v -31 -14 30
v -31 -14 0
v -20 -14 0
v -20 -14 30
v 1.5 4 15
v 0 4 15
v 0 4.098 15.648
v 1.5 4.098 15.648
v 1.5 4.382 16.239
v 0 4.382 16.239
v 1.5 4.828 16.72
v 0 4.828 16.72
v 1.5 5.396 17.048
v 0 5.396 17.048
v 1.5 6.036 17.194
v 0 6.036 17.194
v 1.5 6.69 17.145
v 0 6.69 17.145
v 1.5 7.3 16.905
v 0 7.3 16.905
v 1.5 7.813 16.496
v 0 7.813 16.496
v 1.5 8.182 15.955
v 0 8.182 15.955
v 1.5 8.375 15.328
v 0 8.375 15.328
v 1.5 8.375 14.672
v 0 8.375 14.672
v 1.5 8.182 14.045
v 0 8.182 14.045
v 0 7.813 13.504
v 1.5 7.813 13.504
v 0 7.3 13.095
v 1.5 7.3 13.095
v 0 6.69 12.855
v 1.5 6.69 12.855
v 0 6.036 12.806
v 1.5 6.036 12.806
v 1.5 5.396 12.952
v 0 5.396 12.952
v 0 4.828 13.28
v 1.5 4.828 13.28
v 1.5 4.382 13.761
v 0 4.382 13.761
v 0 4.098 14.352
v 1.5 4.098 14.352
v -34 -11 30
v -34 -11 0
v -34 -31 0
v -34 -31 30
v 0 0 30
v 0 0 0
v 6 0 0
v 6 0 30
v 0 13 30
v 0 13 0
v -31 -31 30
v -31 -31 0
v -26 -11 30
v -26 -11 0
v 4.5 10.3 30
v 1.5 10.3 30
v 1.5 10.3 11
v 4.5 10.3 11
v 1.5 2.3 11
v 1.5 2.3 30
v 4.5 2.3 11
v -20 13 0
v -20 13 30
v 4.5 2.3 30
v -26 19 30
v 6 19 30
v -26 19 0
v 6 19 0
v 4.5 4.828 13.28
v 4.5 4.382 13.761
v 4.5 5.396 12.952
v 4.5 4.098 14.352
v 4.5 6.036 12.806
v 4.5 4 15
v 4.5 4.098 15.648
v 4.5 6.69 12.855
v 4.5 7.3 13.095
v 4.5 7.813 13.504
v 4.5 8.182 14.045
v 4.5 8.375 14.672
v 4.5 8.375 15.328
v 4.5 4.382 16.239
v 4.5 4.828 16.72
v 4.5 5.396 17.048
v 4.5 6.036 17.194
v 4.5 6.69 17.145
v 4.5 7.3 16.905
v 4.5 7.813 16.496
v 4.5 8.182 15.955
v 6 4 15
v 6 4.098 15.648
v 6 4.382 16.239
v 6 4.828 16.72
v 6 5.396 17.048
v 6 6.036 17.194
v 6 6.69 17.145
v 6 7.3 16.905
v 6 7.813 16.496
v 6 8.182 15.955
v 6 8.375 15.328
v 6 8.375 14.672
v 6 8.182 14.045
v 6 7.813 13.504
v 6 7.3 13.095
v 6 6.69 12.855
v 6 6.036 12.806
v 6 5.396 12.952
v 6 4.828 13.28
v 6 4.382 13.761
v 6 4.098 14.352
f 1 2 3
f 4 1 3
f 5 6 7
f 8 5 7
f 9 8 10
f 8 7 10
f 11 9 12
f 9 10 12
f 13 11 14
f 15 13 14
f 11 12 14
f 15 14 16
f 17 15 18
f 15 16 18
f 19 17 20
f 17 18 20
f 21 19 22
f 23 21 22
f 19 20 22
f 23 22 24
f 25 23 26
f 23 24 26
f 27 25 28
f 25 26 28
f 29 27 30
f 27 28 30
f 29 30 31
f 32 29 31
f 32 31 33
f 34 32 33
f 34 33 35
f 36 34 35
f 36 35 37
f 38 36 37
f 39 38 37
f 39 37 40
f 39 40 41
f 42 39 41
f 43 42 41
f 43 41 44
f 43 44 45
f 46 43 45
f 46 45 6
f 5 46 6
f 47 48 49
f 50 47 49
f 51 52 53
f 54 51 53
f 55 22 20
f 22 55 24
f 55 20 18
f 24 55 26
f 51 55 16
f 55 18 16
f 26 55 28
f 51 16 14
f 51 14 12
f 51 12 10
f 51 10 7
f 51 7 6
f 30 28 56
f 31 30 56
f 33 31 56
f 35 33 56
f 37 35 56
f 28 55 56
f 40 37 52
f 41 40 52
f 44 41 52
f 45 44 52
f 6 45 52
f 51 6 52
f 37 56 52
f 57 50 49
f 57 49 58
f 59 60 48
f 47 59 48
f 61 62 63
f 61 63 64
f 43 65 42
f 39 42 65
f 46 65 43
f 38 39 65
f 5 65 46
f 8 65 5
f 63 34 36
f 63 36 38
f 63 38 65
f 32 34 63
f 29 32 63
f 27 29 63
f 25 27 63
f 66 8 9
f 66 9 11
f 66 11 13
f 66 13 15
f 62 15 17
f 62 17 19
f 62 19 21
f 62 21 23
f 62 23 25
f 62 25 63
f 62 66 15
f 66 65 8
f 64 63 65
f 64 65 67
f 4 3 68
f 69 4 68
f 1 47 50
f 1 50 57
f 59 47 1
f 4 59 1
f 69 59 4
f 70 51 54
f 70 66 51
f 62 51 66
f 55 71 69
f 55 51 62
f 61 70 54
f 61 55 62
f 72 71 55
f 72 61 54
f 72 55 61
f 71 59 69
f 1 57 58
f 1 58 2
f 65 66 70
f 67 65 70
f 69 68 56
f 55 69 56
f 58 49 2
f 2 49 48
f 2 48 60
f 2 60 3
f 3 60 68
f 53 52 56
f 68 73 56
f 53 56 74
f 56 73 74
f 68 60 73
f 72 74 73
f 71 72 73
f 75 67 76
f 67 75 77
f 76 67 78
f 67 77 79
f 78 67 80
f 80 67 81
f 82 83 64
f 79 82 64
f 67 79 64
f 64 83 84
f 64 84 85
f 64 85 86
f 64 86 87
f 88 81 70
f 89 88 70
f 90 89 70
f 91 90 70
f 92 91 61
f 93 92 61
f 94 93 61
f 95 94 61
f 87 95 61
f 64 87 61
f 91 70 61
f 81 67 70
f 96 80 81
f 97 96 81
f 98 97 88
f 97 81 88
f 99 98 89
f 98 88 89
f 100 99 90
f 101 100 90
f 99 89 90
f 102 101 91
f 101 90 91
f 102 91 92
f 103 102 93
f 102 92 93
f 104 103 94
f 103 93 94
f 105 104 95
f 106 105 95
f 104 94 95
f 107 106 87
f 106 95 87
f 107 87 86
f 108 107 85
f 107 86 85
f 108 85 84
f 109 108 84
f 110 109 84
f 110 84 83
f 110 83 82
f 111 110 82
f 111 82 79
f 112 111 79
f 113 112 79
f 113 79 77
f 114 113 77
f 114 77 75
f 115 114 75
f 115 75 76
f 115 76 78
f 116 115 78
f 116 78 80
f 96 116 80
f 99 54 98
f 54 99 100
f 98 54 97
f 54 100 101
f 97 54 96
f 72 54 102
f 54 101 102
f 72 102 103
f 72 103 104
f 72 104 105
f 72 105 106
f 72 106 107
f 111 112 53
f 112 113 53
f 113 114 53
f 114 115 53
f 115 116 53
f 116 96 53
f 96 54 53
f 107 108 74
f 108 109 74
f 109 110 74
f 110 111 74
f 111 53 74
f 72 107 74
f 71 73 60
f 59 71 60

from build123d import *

# Parameters (mm, degrees)
F3_DEPTH = 30
F4_R     = 2.2
F5_DEPTH = 6
F6_W     = 3
F6_H     = 8
F7_DEPTH = 19


with BuildPart() as f3:
    # F2 (on Top) → F3 (new body)
    with BuildSketch(Plane.XY):
        Polygon((0, 13), (0, 0), (6, 0), (6, 19), (-26, 19), (-26, -11), (-34, -11), (-34, -31), (-31, -31), (-31, -14), (-20, -14), (-20, 13), align=None)
    extrude(amount=F3_DEPTH)

    # F4 (on face) → F5 (cut)
    with BuildSketch(Plane(origin=(0, 0, 0), x_dir=(0, -1, 0), z_dir=(-1, 0, 0))):
        with Locations((-6.2, 15)):
            Circle(F4_R)
    extrude(amount=-F5_DEPTH, mode=Mode.SUBTRACT)

    # F6 (on face) → F7 (cut)
    with BuildSketch(Plane.XY.offset(30)):
        with Locations((3, 6.3)):
            Rectangle(F6_W, F6_H)
    extrude(amount=-F7_DEPTH, mode=Mode.SUBTRACT)


solid = f3.part
